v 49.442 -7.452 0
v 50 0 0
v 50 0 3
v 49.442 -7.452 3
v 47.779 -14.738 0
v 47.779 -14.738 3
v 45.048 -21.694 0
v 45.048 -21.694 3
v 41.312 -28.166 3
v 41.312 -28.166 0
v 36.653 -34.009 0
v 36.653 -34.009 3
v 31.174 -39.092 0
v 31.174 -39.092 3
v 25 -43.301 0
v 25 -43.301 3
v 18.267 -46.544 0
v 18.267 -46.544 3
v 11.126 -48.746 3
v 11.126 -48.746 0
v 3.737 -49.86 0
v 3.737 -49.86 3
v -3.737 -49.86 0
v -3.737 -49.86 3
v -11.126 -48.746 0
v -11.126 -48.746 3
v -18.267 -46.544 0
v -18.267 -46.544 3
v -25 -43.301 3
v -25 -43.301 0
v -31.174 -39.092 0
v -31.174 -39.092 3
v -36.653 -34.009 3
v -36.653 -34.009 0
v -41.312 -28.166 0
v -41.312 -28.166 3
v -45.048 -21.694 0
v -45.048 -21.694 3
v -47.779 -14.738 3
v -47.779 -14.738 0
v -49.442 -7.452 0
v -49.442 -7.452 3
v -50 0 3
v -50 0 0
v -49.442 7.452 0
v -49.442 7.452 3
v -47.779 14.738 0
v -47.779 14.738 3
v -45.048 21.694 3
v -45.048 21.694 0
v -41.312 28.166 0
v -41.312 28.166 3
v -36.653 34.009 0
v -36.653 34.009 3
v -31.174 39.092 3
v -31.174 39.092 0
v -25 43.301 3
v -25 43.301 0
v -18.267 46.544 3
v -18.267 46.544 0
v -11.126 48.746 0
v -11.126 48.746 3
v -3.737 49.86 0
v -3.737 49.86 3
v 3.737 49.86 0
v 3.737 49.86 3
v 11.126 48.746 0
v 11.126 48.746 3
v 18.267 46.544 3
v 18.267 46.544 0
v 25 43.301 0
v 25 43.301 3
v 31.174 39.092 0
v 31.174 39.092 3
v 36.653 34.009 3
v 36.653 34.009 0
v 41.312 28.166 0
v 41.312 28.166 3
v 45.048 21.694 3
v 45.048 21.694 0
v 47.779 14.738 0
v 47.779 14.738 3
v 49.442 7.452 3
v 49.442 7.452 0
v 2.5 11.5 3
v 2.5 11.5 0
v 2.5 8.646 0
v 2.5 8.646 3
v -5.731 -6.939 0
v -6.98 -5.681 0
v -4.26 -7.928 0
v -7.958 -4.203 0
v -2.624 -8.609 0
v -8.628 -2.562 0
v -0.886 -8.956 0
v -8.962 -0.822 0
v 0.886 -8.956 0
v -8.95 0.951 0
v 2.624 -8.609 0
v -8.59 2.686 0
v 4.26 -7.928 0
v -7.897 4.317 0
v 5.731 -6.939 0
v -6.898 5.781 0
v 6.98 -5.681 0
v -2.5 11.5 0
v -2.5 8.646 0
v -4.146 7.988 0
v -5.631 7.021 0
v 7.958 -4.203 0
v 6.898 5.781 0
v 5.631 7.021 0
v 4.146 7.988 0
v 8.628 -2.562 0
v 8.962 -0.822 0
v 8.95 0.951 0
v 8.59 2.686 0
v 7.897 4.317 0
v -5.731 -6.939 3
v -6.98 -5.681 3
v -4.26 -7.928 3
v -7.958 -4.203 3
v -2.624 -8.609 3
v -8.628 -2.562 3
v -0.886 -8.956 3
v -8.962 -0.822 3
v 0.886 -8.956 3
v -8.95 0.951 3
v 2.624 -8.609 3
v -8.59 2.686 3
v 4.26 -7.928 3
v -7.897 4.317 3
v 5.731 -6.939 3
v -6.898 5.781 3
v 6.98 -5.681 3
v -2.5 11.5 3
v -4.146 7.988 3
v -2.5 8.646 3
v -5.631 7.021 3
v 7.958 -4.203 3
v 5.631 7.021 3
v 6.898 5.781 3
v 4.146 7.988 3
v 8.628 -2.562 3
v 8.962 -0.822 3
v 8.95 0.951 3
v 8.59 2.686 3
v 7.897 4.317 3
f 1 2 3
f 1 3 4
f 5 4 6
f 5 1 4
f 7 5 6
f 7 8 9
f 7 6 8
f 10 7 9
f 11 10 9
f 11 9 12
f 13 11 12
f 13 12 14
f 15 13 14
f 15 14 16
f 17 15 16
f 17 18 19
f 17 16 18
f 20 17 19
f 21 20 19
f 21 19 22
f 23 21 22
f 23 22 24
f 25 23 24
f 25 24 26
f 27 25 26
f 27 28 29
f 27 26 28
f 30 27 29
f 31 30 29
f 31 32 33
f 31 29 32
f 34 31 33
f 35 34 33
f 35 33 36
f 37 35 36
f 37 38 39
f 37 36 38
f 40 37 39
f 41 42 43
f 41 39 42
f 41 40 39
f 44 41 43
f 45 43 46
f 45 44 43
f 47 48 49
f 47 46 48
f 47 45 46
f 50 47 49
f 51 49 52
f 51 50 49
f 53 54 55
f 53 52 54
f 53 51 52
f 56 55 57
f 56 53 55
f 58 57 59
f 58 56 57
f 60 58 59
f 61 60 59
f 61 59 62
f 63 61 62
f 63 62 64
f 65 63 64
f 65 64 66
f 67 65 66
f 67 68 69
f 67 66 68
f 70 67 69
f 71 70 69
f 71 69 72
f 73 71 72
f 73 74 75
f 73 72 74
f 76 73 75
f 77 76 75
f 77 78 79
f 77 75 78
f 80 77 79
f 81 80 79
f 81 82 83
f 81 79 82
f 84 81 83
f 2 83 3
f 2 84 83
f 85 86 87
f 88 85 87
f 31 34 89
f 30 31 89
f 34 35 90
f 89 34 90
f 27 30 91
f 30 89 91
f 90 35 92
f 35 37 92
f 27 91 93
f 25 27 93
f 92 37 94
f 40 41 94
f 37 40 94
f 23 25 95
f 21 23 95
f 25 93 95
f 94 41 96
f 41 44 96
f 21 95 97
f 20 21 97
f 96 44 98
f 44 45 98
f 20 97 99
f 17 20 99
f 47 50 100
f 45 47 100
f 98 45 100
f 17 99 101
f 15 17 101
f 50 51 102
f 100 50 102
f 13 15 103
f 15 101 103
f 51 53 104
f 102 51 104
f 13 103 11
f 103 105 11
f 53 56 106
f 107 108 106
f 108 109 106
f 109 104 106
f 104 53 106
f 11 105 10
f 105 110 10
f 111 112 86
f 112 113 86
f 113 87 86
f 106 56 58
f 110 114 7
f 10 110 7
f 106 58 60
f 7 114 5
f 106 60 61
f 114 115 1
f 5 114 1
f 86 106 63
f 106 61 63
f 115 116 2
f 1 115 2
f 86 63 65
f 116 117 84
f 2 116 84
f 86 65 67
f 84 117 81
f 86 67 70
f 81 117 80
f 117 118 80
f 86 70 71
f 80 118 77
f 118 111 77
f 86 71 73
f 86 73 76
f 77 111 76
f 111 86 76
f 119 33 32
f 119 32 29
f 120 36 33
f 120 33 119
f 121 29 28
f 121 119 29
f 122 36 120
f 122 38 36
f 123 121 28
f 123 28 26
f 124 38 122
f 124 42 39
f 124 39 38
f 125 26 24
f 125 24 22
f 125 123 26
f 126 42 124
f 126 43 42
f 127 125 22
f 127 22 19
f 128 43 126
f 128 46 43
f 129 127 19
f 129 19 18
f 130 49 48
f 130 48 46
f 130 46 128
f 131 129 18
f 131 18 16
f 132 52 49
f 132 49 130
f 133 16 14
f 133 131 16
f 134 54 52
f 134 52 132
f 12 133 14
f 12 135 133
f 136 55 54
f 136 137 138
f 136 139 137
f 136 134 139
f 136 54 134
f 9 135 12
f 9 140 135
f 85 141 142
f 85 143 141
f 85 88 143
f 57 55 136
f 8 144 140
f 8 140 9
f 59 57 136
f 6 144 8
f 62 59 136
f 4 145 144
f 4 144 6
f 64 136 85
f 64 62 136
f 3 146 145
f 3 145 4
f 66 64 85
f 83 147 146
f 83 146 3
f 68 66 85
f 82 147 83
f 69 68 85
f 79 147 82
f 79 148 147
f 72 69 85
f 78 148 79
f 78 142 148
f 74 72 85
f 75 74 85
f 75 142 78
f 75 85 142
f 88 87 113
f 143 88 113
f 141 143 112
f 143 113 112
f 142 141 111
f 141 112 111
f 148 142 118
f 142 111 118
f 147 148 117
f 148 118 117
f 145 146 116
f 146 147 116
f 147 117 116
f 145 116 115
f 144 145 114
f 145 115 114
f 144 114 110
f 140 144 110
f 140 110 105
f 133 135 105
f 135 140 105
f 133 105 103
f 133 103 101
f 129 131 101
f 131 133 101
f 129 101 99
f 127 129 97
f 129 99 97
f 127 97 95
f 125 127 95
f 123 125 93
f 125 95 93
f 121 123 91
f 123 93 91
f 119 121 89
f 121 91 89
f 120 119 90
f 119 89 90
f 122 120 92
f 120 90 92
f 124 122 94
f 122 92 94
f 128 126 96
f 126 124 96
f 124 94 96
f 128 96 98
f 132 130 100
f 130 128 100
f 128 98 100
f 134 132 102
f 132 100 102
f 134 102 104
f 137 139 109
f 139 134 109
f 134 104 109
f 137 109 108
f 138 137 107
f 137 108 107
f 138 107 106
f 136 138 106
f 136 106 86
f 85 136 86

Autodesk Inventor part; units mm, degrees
ref_plane "YZ Plane" through (0, 0, 0) normal (1, 0, 0) x (0, 1, 0)
ref_plane "XZ Plane" through (0, 0, 0) normal (0, 1, 0) x (-1, 0, 0)
ref_plane "XY Plane" through (0, 0, 0) normal (0, 0, 1) x (1, 0, 0)
sketch "Sketch1" plane through (0, 0, 0) normal (0, 0, 1) x (1, 0, 0)
  circle A0 centre (0, 0) radius 50
  arc A1 (-2.5, 8.6458) -> (2.5, 8.6458) centre (0, 0) ccw
  line L0 (-2.5, 11.5) -> (2.5, 11.5)
  line L1 (2.5, 11.5) -> (2.5, 8.6458)
  line L2 (-2.5, 8.6458) -> (-2.5, 11.5)
  point P0 (0, 7.5)
  point P1 (0, 11.5)
  dimension "d0" = 100
  dimension "d1" = 18
  dimension "d3" = 5
  dimension "d4" = 0
  dimension "d5" = 11.5
extrude "Extrusion1" add sketch "Sketch1" along normal blind 3
equation "\"BendRadius\" = Thickness"
equation "\"BendReliefWidth\" = Thickness"
equation "\"BendReliefDepth\" = 0.5 * Thickness"
equation "\"CornerReliefSize\" = 4 * Thickness"
equation "\"MinimumRemnant\" = 2 * Thickness"
equation "\"TransitionRadius\" = BendRadius"
equation "\"JacobiRadiusSize\" = BendRadius"
equation "\"GapSize\" = Thickness"
equation "\"Thickness\" = 0.5"
properties part number "Brake disc"
